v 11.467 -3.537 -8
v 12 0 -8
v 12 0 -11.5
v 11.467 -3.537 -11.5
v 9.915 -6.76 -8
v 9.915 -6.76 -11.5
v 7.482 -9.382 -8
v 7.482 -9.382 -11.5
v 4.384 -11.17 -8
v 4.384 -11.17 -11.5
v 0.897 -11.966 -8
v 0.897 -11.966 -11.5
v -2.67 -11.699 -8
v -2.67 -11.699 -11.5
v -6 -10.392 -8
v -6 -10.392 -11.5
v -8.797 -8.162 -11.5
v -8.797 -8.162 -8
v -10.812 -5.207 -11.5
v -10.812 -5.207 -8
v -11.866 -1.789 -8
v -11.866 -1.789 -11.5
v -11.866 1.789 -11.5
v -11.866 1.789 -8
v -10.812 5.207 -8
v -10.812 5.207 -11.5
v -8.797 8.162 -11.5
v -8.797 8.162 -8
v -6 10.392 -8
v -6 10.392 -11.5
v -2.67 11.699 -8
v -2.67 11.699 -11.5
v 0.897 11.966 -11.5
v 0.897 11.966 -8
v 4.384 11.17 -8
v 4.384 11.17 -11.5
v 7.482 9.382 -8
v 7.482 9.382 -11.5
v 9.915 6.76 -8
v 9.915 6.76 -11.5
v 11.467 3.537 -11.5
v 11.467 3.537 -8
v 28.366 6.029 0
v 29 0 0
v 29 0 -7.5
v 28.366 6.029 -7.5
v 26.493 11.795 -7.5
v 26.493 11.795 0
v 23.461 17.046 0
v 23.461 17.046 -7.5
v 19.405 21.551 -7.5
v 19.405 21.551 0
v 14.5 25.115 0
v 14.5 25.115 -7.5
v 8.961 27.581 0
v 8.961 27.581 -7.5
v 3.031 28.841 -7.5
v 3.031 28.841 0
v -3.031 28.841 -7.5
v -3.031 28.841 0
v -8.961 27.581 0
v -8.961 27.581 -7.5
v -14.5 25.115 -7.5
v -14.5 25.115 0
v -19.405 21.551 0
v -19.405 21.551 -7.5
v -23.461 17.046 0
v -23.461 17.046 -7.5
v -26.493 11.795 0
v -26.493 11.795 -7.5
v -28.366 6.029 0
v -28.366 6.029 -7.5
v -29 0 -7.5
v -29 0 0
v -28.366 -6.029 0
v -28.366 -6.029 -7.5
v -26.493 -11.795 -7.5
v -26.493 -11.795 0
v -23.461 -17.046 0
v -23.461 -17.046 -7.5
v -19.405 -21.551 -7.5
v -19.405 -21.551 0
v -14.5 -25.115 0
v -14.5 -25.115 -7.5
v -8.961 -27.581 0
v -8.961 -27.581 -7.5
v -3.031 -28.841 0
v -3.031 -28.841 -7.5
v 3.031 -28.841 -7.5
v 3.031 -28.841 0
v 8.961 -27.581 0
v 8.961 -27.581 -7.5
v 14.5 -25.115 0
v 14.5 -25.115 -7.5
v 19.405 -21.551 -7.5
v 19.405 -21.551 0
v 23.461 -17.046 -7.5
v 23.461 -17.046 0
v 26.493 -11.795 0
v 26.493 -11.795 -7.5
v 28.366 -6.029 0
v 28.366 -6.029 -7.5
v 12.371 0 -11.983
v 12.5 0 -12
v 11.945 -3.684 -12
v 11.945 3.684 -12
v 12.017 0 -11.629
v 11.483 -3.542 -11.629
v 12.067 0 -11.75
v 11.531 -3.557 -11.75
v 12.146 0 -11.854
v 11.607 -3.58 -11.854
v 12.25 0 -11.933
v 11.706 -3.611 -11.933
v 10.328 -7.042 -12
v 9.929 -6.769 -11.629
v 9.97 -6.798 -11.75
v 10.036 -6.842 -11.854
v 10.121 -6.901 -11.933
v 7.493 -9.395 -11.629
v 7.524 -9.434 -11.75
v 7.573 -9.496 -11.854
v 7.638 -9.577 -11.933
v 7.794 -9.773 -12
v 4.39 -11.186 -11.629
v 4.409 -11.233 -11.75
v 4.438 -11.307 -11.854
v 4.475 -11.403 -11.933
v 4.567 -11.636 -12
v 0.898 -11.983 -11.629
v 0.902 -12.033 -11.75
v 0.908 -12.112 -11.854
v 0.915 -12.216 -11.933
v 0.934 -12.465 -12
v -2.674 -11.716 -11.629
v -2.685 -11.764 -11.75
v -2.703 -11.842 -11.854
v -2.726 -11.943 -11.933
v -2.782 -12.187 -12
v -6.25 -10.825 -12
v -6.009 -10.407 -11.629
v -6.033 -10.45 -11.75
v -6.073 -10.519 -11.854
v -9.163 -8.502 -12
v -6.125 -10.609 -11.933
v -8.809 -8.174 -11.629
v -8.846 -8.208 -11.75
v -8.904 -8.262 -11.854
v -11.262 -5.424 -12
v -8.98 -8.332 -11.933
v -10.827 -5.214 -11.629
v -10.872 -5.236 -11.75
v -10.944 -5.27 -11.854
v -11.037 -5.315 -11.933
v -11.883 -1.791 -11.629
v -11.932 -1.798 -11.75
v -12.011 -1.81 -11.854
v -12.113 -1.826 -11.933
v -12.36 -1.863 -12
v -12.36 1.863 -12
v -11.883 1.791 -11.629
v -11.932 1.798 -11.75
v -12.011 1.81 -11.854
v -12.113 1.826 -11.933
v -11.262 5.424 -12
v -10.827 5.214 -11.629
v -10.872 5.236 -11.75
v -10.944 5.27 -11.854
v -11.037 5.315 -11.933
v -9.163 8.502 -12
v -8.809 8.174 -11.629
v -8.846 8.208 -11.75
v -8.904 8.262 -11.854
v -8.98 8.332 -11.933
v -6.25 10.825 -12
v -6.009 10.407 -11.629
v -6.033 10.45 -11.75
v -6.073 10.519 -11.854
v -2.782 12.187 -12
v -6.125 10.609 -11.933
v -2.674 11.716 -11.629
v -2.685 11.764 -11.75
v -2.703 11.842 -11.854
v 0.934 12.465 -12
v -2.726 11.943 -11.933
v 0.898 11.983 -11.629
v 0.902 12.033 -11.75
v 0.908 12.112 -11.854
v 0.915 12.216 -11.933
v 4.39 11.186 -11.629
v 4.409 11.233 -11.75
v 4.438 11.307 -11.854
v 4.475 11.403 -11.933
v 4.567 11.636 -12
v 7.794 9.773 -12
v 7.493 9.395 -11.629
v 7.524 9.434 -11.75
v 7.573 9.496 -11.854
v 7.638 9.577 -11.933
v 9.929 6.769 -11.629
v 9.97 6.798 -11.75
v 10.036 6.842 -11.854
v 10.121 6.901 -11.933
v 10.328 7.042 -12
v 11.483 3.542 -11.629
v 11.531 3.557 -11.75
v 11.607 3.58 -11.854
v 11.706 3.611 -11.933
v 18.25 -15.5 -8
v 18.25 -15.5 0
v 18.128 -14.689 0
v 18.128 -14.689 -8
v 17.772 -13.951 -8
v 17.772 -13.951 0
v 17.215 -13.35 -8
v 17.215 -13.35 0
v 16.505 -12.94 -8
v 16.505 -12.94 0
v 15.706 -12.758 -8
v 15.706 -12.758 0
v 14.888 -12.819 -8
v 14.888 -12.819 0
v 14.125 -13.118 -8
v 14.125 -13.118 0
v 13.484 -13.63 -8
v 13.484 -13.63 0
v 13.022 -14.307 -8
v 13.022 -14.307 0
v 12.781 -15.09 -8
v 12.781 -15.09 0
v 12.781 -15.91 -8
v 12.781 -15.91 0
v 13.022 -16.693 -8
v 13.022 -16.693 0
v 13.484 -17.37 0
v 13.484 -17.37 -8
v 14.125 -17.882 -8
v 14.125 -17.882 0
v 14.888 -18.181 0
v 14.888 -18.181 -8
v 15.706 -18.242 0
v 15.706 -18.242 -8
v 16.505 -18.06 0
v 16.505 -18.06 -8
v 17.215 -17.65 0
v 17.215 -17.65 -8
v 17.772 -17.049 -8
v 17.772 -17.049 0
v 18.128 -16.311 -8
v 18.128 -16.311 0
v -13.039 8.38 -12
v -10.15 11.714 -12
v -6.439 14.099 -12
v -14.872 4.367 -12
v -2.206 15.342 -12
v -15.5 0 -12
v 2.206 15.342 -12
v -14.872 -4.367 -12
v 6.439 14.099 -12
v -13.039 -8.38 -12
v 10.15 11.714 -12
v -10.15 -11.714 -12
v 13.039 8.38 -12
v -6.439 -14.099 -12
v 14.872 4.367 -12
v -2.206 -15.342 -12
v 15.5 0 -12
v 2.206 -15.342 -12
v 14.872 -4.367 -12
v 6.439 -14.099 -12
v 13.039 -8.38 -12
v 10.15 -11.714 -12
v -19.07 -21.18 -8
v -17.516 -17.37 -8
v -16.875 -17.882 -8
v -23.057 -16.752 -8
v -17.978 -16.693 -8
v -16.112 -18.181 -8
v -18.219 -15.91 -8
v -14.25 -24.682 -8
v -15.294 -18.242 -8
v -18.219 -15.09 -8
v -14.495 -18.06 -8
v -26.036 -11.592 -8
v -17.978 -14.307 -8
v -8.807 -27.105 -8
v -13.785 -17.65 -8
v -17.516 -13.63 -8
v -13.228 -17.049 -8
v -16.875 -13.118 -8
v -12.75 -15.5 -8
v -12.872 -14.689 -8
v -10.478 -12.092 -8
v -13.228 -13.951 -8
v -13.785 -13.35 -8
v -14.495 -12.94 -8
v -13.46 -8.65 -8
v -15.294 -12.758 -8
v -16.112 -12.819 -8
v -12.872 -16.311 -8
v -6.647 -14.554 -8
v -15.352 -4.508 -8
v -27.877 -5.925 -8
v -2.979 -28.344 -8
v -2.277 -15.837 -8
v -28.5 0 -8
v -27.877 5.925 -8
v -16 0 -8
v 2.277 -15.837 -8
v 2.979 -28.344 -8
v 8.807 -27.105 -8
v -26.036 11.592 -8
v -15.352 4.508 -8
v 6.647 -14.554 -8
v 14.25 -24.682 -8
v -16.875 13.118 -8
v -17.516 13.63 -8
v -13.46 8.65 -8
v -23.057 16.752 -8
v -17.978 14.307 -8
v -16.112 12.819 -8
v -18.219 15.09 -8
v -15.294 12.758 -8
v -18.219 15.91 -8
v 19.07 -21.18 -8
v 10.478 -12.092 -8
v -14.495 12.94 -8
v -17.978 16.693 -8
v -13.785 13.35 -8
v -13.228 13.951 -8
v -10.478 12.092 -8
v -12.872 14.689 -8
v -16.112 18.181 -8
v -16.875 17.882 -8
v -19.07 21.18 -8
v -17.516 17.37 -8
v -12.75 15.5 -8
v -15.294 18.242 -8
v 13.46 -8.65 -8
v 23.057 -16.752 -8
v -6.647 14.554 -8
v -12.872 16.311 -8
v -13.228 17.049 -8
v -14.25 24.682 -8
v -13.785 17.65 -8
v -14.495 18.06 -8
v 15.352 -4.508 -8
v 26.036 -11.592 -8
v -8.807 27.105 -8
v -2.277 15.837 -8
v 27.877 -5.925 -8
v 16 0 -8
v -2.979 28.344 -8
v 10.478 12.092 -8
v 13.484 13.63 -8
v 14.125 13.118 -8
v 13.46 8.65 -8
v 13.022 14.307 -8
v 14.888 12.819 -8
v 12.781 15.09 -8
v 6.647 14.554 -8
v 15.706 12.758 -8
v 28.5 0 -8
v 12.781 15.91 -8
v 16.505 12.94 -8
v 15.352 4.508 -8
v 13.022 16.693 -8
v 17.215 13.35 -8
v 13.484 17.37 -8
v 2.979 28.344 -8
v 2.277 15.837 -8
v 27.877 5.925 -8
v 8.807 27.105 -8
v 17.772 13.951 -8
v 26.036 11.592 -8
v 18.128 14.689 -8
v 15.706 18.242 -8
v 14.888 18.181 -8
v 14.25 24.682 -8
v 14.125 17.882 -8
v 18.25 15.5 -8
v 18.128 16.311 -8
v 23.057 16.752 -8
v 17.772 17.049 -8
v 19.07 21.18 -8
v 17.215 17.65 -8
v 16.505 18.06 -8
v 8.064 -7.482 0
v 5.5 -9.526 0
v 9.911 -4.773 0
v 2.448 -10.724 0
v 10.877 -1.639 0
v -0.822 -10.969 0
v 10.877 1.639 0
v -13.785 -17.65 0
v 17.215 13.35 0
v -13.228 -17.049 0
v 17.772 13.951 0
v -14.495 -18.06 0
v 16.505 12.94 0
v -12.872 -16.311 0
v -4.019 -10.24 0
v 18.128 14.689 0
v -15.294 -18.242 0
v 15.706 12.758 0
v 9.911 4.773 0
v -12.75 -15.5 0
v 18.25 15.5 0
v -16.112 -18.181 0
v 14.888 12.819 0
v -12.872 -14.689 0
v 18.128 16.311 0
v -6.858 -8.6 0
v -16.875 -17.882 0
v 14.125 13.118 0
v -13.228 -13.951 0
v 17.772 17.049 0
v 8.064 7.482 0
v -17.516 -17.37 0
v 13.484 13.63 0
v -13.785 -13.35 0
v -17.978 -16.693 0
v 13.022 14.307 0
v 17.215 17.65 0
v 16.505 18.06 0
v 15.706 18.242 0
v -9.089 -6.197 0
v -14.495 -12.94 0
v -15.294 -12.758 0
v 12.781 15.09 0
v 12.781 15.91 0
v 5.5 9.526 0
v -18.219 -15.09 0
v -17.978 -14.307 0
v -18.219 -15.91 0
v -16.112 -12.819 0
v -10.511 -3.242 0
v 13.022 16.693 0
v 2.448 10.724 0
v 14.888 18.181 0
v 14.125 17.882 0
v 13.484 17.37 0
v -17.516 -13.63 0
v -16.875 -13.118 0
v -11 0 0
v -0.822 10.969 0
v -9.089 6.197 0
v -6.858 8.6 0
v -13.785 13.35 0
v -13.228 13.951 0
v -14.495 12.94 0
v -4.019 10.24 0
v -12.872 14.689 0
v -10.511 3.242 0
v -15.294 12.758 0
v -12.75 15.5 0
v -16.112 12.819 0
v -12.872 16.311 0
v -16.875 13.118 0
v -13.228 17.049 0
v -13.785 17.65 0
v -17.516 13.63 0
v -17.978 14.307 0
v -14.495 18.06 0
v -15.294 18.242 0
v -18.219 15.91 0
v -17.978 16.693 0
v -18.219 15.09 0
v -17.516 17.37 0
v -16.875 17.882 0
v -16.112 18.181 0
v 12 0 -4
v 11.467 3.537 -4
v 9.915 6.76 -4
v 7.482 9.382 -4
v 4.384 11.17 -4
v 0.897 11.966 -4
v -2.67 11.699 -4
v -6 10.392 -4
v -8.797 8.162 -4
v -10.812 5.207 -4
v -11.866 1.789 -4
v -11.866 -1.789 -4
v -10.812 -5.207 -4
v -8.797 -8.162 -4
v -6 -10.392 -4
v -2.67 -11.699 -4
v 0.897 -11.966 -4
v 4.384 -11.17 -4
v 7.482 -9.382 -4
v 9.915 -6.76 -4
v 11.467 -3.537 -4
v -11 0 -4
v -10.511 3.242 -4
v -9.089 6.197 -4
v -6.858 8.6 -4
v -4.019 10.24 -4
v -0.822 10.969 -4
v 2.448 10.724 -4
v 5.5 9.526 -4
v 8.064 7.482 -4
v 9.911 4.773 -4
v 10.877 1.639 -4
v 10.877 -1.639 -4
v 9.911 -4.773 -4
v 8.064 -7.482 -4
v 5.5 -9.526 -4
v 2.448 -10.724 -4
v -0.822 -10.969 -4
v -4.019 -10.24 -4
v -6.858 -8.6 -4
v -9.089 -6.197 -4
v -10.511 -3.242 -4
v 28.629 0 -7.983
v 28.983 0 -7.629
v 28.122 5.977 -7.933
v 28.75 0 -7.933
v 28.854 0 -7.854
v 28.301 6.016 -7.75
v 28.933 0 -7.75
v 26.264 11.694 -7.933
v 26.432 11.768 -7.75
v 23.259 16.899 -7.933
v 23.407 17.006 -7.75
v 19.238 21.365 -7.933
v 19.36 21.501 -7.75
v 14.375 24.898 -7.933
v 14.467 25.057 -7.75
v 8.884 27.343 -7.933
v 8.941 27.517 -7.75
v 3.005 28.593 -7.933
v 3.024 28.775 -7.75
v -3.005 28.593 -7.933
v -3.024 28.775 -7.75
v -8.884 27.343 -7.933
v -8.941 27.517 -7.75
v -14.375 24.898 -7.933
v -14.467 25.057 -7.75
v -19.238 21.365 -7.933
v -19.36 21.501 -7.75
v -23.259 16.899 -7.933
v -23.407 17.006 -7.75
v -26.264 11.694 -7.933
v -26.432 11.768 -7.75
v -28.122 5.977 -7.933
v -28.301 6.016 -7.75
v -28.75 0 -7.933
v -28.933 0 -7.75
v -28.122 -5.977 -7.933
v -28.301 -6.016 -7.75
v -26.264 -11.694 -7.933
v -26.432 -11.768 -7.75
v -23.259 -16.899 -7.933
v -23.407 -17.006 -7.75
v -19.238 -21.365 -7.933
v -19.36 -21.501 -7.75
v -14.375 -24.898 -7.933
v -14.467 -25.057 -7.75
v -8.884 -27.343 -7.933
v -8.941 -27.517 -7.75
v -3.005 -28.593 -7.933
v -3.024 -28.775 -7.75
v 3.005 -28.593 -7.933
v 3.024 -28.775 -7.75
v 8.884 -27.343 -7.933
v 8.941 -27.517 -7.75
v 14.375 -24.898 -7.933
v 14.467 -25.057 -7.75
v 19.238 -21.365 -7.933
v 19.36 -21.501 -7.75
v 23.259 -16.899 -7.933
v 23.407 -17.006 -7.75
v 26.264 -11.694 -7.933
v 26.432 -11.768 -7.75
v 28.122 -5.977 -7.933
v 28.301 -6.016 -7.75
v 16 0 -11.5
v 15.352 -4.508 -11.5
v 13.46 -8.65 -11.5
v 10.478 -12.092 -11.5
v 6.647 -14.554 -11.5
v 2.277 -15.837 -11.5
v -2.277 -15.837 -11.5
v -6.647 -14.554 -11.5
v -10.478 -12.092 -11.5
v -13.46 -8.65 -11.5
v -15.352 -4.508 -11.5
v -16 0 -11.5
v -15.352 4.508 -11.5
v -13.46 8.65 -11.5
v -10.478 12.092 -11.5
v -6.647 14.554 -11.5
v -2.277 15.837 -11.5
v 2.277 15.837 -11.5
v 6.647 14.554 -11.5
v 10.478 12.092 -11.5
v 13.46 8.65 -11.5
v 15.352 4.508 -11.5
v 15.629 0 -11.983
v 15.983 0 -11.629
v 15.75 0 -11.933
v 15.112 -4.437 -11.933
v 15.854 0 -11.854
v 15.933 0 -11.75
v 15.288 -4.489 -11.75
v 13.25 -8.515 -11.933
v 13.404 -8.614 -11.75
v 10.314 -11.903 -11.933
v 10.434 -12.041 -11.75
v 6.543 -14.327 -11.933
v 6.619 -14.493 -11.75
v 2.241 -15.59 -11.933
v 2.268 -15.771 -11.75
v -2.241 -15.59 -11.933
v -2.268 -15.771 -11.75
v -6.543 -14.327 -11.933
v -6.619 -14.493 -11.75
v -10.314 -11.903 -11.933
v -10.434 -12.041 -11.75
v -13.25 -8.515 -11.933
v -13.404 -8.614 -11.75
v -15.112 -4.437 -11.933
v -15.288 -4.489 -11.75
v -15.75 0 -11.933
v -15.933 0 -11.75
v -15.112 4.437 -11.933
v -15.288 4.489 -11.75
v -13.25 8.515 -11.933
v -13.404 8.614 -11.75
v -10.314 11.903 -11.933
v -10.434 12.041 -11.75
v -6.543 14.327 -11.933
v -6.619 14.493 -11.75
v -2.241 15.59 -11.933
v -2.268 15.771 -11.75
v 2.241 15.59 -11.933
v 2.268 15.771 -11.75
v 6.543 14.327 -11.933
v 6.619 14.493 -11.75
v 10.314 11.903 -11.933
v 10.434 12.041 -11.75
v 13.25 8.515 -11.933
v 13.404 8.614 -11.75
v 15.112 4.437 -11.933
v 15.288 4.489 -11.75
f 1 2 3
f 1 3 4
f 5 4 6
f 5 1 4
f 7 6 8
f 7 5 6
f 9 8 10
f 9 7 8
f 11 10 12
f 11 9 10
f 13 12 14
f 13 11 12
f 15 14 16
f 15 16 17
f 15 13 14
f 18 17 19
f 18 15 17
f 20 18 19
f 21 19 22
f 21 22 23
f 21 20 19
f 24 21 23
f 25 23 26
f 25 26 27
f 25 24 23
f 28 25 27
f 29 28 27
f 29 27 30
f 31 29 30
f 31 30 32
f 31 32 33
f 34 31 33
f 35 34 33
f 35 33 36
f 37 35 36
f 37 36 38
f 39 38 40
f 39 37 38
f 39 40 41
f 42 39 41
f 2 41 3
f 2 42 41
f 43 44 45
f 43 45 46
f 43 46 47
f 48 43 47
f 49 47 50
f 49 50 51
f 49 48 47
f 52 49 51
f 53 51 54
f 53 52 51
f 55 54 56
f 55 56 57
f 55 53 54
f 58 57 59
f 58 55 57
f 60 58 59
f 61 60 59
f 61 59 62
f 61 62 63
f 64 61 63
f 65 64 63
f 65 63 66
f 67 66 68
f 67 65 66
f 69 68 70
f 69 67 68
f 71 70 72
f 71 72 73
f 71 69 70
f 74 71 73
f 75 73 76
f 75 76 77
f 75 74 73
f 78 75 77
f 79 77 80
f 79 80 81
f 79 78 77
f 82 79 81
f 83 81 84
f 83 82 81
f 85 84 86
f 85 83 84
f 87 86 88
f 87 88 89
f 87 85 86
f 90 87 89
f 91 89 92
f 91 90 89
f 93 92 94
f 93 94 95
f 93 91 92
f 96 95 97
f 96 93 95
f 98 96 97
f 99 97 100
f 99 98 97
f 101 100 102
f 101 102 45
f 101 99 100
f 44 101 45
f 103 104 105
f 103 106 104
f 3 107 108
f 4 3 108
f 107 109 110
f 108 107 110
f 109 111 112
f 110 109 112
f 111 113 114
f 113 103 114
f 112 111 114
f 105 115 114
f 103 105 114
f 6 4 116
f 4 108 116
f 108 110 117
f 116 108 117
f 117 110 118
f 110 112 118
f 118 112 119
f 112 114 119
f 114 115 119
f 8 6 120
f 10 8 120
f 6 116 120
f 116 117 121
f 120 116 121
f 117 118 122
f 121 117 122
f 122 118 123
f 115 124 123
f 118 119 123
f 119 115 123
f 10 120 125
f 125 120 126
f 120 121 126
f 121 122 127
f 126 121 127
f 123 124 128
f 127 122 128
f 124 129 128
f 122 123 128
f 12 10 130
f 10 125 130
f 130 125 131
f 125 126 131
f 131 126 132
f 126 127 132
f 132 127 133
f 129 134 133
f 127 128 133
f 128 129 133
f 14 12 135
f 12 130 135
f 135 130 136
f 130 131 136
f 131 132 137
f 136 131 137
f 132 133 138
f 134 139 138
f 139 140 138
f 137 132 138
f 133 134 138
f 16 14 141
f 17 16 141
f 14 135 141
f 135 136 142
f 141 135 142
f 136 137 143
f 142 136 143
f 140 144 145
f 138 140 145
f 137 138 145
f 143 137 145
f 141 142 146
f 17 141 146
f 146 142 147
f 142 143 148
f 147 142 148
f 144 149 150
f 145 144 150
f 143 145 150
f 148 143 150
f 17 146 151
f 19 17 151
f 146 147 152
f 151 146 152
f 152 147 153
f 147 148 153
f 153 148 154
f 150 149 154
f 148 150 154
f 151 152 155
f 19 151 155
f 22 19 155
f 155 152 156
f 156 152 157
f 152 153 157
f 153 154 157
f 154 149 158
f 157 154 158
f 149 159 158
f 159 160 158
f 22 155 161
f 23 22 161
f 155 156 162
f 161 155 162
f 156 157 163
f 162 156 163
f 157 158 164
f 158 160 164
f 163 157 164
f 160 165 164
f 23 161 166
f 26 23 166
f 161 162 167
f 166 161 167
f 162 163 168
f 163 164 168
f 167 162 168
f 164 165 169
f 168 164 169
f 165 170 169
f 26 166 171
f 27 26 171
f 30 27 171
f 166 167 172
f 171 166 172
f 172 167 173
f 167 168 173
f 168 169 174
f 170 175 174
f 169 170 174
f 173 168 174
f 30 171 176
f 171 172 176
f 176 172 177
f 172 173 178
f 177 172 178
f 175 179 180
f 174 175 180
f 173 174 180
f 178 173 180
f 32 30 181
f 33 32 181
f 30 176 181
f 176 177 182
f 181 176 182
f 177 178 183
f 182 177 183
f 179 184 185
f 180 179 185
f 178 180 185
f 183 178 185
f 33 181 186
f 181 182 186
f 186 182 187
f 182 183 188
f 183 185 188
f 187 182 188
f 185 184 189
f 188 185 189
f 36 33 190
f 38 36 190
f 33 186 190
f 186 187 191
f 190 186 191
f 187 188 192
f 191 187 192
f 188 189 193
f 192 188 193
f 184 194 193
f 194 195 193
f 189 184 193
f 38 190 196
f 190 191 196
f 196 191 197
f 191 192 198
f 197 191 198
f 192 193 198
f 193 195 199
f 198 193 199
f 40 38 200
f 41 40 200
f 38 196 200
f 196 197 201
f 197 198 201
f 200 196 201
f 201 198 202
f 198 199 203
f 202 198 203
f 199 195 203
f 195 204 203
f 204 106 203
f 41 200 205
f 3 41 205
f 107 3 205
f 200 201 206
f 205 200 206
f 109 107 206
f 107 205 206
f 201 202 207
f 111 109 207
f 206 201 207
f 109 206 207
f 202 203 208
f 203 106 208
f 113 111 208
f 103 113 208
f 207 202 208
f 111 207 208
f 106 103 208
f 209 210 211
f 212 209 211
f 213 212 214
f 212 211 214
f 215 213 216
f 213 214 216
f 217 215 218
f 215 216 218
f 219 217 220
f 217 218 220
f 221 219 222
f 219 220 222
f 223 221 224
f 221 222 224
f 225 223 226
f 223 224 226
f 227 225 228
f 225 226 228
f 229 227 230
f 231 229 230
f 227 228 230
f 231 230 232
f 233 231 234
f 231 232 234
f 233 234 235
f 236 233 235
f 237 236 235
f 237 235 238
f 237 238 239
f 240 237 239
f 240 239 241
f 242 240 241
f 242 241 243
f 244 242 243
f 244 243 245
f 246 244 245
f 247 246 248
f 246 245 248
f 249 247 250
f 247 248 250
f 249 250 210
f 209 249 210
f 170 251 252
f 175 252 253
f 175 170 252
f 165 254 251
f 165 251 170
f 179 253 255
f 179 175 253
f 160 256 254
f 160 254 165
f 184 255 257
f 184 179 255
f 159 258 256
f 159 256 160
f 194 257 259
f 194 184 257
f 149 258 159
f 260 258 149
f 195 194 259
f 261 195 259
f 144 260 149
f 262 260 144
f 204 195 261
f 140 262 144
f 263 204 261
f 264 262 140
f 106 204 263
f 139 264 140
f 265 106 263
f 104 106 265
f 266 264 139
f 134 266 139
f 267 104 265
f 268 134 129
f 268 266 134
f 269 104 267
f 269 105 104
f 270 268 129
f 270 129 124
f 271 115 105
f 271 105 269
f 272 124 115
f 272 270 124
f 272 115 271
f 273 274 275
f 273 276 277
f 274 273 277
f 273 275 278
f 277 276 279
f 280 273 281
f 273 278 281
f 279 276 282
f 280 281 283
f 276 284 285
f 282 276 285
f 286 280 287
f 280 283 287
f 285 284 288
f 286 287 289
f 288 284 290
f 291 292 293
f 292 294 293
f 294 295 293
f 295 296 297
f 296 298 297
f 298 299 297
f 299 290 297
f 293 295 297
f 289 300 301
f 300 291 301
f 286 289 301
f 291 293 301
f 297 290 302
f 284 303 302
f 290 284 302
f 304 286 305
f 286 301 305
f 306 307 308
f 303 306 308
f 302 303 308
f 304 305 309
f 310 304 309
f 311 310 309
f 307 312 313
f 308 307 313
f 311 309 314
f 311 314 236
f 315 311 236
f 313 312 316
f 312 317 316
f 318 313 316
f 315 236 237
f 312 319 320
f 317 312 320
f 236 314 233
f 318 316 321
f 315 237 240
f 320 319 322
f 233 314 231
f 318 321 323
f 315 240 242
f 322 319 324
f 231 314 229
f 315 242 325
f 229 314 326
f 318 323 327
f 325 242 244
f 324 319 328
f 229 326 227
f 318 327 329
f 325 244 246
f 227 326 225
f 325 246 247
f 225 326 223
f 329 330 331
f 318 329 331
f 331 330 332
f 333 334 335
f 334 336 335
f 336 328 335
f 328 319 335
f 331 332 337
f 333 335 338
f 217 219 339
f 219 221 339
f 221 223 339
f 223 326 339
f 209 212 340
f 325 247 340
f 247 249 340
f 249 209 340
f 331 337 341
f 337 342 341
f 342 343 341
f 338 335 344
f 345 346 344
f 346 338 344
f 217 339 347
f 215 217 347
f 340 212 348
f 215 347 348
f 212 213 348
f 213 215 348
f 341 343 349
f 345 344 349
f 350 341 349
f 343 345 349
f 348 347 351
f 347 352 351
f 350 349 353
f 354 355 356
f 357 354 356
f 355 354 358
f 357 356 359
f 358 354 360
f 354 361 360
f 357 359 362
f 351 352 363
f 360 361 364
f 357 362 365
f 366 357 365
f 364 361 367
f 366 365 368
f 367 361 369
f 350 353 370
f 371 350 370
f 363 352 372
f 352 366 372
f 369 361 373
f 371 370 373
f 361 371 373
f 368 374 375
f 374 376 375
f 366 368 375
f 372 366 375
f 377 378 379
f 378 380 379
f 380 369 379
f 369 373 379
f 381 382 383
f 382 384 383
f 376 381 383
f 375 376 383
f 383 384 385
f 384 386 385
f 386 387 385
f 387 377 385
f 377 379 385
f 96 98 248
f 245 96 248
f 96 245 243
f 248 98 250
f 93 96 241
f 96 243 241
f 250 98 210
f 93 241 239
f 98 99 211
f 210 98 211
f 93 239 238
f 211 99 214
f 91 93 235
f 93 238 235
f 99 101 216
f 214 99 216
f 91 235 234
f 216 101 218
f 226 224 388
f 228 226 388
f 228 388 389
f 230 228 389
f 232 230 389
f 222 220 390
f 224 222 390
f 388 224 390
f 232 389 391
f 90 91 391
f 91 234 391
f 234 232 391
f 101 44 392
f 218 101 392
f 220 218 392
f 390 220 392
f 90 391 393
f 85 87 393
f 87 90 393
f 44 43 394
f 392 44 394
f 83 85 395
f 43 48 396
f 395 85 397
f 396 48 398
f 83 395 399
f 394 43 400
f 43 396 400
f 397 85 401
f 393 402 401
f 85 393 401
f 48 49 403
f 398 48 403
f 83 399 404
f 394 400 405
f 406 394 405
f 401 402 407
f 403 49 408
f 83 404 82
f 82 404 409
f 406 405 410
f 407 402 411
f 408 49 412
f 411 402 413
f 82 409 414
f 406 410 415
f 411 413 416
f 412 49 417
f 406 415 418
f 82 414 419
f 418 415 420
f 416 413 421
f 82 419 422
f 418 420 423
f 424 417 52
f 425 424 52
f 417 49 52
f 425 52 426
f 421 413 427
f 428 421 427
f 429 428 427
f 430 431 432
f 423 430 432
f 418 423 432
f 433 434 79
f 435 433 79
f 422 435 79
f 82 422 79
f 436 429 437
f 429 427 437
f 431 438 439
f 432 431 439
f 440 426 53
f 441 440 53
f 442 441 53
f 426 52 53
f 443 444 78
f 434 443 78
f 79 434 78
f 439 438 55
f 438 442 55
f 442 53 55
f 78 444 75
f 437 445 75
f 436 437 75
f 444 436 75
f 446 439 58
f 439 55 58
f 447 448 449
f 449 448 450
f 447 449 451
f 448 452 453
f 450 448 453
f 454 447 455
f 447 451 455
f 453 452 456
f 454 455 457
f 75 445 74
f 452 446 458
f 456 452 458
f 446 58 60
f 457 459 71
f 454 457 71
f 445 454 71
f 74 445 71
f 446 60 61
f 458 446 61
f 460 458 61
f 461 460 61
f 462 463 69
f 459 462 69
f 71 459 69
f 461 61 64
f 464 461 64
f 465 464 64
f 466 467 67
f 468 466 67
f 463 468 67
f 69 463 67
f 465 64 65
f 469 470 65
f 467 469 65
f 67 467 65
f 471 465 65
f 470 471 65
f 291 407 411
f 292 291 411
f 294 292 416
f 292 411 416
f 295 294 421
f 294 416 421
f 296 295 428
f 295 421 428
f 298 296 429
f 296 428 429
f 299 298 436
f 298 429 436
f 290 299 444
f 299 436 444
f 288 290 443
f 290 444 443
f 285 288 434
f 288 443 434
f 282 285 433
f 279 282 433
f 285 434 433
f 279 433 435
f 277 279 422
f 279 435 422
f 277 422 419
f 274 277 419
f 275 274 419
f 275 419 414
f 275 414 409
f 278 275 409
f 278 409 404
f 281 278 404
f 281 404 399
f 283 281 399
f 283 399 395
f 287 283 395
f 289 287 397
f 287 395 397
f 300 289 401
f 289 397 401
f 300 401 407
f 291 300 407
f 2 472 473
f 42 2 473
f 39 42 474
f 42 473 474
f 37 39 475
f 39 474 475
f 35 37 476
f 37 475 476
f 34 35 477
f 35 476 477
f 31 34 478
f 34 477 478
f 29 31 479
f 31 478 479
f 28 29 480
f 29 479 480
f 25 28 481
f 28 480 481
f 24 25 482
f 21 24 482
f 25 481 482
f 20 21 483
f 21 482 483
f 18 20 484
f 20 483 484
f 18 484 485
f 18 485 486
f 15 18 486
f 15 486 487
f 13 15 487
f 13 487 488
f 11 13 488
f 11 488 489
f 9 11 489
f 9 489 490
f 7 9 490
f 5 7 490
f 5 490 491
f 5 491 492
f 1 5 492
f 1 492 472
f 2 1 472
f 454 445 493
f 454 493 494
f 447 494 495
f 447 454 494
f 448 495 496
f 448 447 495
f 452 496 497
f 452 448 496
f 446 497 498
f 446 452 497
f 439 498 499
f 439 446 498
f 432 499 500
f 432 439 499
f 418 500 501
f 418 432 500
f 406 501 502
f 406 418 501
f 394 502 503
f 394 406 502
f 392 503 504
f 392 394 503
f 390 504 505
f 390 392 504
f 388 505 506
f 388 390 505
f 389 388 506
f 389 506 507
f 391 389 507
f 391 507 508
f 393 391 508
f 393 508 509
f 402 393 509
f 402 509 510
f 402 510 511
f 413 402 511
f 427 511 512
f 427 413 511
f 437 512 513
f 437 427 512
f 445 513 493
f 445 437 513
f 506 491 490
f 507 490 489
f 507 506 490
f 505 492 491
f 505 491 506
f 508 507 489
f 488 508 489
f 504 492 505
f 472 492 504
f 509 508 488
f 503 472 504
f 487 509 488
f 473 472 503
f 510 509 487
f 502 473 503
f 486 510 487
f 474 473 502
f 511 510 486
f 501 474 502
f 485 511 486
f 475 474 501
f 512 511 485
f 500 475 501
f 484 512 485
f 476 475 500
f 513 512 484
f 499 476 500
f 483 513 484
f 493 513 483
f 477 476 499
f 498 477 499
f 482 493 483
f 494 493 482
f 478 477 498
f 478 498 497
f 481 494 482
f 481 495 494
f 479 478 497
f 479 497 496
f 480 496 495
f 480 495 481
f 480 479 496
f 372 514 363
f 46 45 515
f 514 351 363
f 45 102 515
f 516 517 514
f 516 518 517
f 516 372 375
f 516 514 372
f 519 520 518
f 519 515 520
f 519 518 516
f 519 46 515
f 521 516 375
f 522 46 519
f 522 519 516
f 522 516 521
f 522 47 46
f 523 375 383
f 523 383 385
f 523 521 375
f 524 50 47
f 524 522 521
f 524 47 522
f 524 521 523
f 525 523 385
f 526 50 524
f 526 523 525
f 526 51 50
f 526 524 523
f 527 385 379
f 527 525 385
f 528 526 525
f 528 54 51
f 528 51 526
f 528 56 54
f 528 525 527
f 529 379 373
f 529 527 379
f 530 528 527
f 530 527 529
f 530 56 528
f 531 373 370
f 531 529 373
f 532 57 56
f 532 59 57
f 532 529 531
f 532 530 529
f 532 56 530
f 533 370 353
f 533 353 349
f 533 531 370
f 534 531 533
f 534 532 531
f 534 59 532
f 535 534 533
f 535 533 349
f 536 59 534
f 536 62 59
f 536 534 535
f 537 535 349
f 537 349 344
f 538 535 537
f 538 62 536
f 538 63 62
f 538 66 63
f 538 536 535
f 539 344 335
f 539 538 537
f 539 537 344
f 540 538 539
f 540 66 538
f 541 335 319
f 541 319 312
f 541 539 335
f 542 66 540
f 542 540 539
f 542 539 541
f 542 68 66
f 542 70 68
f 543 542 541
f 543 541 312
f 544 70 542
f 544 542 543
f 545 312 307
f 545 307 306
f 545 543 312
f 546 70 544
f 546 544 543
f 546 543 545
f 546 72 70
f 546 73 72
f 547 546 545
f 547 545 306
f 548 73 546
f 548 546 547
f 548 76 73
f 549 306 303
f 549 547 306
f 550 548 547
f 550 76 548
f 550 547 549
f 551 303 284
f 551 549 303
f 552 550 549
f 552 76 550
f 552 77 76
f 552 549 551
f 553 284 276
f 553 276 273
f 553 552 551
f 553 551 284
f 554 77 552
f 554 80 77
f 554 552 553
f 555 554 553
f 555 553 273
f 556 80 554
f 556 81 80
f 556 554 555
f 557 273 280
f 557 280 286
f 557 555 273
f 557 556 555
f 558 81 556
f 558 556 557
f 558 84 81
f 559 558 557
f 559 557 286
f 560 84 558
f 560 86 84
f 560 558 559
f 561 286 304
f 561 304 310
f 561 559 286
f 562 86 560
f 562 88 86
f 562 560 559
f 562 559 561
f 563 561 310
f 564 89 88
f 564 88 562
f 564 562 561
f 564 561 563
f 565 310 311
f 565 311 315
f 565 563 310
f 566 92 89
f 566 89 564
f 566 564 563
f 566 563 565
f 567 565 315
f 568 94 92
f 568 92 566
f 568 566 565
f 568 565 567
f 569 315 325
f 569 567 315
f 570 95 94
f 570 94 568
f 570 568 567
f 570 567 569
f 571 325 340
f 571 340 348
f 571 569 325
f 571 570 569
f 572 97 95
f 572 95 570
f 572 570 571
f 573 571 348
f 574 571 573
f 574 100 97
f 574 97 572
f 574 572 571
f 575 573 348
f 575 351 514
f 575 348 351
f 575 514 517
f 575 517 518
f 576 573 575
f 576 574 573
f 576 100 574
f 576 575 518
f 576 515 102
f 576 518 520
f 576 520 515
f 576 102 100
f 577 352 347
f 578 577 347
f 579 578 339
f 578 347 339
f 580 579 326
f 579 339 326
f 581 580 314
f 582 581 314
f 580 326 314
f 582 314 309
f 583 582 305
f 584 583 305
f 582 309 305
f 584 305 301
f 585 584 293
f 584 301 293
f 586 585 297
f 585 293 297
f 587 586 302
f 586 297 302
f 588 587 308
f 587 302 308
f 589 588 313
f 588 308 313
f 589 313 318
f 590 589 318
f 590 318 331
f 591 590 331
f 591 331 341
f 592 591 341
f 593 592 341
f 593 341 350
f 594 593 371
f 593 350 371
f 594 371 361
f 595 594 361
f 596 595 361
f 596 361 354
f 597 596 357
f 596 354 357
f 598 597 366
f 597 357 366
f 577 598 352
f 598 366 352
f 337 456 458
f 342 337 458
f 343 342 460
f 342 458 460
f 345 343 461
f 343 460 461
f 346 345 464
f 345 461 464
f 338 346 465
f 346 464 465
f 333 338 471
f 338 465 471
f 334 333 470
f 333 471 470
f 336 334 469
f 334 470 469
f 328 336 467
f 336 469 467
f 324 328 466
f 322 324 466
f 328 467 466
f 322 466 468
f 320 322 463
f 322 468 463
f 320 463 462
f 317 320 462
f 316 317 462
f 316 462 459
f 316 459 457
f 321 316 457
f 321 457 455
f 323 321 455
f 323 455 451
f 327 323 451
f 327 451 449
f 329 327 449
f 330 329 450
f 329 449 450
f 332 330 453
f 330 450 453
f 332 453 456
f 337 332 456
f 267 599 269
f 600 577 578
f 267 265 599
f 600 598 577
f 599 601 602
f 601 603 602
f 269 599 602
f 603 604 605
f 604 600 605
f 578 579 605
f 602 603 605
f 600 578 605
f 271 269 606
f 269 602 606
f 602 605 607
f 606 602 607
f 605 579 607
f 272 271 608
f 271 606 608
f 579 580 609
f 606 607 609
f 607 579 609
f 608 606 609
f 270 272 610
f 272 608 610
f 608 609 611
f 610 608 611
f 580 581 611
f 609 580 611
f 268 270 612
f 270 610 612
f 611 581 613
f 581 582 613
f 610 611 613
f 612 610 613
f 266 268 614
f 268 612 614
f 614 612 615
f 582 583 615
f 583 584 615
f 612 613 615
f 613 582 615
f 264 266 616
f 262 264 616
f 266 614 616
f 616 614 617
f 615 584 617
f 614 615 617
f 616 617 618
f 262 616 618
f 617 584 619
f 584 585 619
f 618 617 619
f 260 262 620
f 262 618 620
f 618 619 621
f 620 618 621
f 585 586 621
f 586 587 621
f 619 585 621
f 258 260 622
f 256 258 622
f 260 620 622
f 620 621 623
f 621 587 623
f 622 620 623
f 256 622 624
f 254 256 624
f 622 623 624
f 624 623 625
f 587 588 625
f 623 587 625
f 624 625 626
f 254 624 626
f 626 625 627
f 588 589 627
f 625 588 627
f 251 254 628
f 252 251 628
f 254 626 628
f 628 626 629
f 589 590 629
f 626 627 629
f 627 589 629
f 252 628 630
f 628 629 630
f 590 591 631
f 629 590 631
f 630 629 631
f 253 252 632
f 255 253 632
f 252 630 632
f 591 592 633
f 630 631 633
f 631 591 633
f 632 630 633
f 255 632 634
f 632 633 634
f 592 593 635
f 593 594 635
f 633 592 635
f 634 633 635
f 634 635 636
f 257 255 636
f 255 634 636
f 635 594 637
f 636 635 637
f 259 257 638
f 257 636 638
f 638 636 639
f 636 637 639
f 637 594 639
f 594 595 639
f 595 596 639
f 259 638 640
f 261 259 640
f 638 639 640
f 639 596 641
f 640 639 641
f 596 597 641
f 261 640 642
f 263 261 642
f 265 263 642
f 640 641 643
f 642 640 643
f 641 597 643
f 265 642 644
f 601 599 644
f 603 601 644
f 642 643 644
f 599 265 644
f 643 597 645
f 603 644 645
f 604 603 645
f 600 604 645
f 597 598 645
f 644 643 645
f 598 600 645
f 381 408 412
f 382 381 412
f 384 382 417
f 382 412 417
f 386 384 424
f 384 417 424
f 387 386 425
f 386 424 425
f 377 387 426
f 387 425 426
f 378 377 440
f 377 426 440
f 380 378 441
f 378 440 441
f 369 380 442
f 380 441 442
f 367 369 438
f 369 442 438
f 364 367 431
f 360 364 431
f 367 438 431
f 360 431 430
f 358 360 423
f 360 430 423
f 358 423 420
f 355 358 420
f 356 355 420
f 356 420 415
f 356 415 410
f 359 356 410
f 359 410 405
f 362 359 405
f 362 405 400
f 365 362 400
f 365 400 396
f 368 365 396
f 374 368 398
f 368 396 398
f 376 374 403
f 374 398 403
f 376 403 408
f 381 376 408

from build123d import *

# Parameters (mm, degrees)
CROQUIS1_R              = 29
CROQUIS1_R_2            = 2.75
CROQUIS1_R_3            = 12
SALIENTE_EXTRUIR1_DEPTH = 8
CROQUIS2_R              = 16
CROQUIS2_R_2            = 12
SALIENTE_EXTRUIR2_DEPTH = 4
SALIENTE_EXTRUIR3_START = -4
CROQUIS3_R              = 12
CROQUIS3_R_2            = 11
SALIENTE_EXTRUIR3_DEPTH = 4
REDONDEO2_R             = 0.5


with BuildPart() as part:
    # Croquis1 → Saliente-Extruir1 (new body)
    with BuildSketch(Plane.XY):
        Circle(CROQUIS1_R)
        with Locations((-15.5, 15.5)):
            Circle(CROQUIS1_R_2, mode=Mode.SUBTRACT)
        with Locations((15.5, 15.5)):
            Circle(CROQUIS1_R_2, mode=Mode.SUBTRACT)
        with Locations((15.5, -15.5)):
            Circle(CROQUIS1_R_2, mode=Mode.SUBTRACT)
        with Locations((-15.5, -15.5)):
            Circle(CROQUIS1_R_2, mode=Mode.SUBTRACT)
        Circle(CROQUIS1_R_3, mode=Mode.SUBTRACT)
    extrude(amount=-SALIENTE_EXTRUIR1_DEPTH)

    # Croquis2 → Saliente-Extruir2 (add)
    with BuildSketch(Plane(origin=(0, 0, -8), x_dir=(-1, 0, 0), z_dir=(0, 0, -1))):
        with Locations(Location((0, 0, 0), (0, 0, 180))):
            Circle(CROQUIS2_R)
        with Locations(Location((0, 0, 0), (0, 0, 180))):
            Circle(CROQUIS2_R_2, mode=Mode.SUBTRACT)
    extrude(amount=SALIENTE_EXTRUIR2_DEPTH)

    # Croquis3 → Saliente-Extruir3 (add)
    with BuildSketch(Plane(origin=(0, 0, -4), x_dir=(-1, 0, 0), z_dir=(0, 0, -1)).offset(SALIENTE_EXTRUIR3_START)):
        Circle(CROQUIS3_R)
        Circle(CROQUIS3_R_2, mode=Mode.SUBTRACT)
    extrude(amount=SALIENTE_EXTRUIR3_DEPTH)

    # Redondeo2
    redondeo2_edges = [part.edges().sort_by_distance(p)[0] for p in [
        (-16, 0, -12),
        (-12, 0, -12),
        (-29, 0, -8),
    ]]
    fillet(redondeo2_edges, radius=REDONDEO2_R)


solid = part.part
